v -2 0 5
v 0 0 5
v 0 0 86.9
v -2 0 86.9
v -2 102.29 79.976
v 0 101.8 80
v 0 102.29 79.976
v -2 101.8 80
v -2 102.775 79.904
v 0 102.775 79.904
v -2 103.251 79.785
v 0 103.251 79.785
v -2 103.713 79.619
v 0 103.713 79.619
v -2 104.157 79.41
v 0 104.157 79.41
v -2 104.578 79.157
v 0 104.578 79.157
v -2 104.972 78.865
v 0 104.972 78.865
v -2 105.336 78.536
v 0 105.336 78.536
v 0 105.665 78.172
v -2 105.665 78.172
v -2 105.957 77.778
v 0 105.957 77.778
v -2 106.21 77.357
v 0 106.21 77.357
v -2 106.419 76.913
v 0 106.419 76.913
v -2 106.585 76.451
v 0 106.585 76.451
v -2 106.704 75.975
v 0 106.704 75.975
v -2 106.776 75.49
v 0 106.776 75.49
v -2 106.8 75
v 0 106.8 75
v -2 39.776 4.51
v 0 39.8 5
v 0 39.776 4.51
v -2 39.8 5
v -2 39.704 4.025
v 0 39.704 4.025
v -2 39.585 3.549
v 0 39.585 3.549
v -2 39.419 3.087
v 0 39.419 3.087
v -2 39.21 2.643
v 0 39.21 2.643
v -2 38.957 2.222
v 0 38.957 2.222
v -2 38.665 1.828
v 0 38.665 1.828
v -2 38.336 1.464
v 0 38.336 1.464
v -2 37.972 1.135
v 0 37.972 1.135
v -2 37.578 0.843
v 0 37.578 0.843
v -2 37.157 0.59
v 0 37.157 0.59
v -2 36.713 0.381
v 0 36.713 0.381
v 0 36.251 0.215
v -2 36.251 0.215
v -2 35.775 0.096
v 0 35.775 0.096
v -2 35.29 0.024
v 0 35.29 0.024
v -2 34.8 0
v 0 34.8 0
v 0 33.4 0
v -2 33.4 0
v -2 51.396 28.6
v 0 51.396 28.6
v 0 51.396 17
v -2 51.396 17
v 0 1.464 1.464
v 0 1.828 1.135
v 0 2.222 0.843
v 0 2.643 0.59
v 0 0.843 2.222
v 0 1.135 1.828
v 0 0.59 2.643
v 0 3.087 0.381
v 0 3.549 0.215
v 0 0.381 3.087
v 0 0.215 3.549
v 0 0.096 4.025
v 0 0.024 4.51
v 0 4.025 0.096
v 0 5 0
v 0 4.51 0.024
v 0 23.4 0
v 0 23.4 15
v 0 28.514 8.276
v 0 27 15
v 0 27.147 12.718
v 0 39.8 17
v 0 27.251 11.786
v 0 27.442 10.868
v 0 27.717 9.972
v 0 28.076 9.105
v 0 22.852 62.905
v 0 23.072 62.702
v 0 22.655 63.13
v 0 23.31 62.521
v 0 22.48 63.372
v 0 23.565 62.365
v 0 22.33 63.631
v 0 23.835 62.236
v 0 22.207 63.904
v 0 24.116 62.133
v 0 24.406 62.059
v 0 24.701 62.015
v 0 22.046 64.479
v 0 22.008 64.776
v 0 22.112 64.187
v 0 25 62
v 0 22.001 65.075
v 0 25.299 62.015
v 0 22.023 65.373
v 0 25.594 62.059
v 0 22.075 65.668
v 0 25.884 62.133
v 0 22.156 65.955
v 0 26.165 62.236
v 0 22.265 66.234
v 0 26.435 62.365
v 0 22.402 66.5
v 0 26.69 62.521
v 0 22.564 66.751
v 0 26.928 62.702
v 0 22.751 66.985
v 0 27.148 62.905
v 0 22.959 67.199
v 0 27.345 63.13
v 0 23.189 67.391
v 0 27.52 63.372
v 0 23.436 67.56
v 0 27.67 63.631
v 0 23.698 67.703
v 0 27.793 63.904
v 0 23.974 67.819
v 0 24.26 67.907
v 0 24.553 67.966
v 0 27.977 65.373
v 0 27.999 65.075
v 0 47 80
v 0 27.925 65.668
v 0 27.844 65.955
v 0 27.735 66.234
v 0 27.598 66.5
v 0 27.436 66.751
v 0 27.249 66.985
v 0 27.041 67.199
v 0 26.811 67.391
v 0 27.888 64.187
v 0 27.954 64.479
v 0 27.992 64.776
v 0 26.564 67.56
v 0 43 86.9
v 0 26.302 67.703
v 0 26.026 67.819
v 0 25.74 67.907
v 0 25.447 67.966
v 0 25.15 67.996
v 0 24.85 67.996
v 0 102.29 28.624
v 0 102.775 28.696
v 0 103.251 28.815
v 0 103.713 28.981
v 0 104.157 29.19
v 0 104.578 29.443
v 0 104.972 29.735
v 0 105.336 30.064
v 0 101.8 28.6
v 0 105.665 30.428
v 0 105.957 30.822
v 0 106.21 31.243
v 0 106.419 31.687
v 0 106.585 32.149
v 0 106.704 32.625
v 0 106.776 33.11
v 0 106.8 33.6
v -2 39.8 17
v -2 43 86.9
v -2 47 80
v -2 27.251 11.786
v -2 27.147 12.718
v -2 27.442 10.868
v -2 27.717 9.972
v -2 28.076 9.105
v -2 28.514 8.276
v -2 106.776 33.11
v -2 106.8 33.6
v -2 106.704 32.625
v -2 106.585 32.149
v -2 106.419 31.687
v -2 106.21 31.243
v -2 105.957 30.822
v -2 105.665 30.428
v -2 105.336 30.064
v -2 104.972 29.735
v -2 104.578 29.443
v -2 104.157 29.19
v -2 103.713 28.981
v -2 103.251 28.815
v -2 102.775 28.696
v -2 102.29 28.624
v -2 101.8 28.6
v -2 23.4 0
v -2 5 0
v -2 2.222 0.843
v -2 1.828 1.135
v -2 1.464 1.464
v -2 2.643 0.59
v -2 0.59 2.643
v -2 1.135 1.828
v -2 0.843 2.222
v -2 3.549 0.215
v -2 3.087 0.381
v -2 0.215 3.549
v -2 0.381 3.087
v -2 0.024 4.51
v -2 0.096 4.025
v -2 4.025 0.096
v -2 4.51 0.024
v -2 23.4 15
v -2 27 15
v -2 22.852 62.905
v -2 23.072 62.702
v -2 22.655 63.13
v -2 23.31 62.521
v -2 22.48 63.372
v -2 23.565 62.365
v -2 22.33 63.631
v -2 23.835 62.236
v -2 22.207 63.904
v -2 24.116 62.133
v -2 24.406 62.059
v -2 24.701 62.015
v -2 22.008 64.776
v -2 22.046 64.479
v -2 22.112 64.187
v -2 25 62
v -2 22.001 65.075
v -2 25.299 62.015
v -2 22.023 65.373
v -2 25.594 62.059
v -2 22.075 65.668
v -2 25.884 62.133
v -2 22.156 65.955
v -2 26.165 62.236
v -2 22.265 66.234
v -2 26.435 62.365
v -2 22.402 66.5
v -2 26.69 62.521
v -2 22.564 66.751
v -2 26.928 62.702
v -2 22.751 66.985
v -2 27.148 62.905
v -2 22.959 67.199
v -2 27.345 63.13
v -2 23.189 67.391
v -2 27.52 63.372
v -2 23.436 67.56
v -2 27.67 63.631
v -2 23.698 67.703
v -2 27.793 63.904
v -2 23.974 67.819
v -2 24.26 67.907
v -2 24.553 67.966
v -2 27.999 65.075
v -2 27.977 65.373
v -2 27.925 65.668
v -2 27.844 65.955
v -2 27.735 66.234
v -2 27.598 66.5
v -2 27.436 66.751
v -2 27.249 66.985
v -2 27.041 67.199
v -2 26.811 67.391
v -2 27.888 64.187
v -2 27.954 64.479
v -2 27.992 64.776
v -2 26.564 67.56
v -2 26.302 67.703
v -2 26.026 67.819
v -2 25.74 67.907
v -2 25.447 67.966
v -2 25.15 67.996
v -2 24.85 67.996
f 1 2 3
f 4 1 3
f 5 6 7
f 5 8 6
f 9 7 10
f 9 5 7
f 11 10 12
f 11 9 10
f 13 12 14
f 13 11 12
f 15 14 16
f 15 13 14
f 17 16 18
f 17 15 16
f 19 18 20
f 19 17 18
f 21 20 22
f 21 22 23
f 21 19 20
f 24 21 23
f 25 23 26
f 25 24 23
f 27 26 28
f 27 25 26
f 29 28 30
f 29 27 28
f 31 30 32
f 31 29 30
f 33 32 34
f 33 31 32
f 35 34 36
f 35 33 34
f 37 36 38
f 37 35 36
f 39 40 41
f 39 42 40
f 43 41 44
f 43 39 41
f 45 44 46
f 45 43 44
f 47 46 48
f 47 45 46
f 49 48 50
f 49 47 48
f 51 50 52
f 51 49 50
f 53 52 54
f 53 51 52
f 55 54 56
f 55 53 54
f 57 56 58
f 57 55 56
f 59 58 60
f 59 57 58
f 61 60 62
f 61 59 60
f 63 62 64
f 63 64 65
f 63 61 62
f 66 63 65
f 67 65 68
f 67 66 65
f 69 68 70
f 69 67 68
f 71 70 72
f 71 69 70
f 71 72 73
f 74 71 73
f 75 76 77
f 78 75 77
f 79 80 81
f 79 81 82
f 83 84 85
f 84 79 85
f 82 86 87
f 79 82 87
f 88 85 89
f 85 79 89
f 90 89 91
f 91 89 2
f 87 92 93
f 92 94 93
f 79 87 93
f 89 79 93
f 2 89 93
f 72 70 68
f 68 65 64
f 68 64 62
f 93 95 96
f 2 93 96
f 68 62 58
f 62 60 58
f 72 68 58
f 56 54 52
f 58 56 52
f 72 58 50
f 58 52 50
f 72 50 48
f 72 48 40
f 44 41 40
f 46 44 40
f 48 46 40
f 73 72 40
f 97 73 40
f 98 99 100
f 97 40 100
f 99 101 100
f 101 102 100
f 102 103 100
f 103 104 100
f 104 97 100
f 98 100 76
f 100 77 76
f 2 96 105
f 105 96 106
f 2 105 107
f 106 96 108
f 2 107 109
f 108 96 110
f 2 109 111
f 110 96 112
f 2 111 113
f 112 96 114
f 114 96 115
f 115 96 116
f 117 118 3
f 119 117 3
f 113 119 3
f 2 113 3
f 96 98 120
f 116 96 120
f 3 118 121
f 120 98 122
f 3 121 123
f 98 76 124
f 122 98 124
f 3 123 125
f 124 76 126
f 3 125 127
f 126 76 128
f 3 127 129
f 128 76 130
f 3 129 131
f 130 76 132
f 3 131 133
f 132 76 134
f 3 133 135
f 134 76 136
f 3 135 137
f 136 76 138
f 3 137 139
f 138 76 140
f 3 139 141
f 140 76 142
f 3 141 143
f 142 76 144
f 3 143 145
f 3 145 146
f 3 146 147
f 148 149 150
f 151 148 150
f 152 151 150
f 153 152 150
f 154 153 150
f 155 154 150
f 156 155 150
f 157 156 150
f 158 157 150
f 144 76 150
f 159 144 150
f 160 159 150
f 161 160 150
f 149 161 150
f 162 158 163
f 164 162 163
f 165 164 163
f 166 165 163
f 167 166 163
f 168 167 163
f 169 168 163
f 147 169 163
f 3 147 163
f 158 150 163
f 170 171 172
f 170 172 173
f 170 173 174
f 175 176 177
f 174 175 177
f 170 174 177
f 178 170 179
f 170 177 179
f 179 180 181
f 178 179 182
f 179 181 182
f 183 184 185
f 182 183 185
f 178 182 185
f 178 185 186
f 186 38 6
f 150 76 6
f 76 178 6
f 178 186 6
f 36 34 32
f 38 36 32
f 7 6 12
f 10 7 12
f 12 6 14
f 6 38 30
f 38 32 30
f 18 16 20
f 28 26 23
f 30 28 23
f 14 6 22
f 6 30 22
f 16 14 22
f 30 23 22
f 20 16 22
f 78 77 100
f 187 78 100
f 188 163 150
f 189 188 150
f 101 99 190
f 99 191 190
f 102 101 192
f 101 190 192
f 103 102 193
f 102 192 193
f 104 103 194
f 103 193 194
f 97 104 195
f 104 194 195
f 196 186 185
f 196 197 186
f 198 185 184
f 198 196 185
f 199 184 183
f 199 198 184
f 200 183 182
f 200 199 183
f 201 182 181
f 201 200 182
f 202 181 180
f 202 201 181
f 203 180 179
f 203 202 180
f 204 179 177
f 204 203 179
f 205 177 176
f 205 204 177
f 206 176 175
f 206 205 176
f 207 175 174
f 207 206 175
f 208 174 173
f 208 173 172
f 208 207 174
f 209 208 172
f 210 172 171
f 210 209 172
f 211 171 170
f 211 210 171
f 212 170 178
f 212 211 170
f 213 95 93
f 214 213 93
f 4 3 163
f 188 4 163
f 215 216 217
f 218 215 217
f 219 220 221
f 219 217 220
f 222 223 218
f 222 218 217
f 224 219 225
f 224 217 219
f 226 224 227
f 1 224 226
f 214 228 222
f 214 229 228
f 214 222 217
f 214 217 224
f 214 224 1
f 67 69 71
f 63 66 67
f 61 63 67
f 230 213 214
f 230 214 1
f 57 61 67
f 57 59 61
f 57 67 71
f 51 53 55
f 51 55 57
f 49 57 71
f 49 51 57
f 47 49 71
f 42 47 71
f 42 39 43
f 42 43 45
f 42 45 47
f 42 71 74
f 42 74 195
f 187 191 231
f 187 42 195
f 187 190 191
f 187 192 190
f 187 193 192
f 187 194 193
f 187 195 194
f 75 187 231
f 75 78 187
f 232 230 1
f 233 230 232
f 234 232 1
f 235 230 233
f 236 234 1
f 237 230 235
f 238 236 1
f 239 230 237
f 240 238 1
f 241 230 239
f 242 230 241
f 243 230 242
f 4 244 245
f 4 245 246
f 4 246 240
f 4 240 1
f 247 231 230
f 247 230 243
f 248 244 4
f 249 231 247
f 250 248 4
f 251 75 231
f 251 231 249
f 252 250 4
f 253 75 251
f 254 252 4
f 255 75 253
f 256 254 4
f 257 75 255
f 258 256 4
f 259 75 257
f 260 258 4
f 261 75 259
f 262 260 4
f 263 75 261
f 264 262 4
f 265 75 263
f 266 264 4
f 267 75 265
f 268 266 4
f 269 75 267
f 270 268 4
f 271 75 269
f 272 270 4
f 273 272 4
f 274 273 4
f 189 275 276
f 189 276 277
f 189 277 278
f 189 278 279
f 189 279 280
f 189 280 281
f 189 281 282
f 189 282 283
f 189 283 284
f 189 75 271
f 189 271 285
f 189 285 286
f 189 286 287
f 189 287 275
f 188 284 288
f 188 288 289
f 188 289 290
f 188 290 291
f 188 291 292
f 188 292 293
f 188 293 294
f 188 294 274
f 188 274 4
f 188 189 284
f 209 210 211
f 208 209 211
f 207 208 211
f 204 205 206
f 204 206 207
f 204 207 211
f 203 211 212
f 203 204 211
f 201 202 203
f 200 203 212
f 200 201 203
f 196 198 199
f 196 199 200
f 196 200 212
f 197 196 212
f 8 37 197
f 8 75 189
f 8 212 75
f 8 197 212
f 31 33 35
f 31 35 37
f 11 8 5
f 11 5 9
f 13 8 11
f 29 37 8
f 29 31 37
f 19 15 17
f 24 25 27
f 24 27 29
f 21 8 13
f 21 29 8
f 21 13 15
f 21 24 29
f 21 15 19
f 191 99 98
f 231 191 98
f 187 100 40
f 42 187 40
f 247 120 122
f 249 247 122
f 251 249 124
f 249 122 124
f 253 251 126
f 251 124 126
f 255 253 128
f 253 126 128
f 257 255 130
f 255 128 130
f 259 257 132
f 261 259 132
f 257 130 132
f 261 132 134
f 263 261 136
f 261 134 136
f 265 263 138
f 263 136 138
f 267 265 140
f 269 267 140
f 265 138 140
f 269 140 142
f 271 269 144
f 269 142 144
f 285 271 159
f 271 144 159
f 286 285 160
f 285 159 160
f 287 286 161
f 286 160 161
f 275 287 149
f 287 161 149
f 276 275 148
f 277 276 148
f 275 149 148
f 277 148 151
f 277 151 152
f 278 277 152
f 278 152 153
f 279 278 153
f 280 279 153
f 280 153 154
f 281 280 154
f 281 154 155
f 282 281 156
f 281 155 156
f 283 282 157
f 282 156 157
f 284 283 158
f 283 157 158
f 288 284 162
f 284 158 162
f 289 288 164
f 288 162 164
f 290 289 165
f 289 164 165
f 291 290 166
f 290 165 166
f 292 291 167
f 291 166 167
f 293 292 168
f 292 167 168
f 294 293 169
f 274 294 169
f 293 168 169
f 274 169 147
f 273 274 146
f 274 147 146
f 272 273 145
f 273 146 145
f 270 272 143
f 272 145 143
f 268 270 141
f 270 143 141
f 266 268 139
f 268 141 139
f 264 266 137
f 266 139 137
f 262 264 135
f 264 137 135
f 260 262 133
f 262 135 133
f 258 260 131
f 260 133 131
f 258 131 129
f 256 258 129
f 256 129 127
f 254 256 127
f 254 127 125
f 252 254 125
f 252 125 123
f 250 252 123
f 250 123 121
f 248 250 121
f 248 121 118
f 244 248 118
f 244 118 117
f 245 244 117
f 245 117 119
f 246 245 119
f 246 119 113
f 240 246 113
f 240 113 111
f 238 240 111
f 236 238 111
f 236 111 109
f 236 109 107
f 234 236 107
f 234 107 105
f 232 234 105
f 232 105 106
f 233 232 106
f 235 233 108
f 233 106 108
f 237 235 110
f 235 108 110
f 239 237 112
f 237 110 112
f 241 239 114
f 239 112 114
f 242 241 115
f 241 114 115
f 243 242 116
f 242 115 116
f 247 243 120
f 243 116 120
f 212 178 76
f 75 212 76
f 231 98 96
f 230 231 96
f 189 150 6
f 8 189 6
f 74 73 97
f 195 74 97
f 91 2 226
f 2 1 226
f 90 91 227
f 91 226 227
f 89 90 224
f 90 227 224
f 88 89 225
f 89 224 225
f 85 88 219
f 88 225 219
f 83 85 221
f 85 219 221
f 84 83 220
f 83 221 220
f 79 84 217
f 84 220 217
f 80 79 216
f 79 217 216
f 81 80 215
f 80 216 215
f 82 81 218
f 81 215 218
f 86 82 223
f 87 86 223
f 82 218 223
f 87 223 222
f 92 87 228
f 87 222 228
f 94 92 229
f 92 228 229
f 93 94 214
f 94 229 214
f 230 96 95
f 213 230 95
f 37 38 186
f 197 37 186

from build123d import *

# Parameters (mm, degrees)
AUFSATZ_LINEAR_AUSTRAGEN1_DEPTH = 2
VERRUNDUNG6_R                   = 5
VERRUNDUNG7_R                   = 10
SKIZZE4_R                       = 3
SCHNITT_LINEAR_AUSTRAGEN1_DEPTH = 2


with BuildPart() as part:
    # Skizze2 → Aufsatz-Linear austragen1 (new body)
    with BuildSketch(Plane(origin=(0, 0, 0), x_dir=(0, 0, -1), z_dir=(1, 0, 0))):
        Polygon((0, 0), (-86.9, 0), (-86.9, 43), (-80, 47), (-80, 106.8), (-28.6, 106.8), (-28.6, 51.396087758), (-17, 51.396087758), (-17, 39.8), (0, 39.8), (0, 33.4), (-10.333924714, 27.3), (-15, 27), (-15, 23.4), (0, 23.4), align=None)
    extrude(amount=-AUFSATZ_LINEAR_AUSTRAGEN1_DEPTH)

    # Verrundung6
    verrundung6_edges = [part.edges().sort_by_distance(p)[0] for p in [
        (-1, 0, 0),
        (-1, 106.8, 80),
        (-1, 106.8, 28.6),
        (-1, 39.8, 0),
    ]]
    fillet(verrundung6_edges, radius=VERRUNDUNG6_R)

    # Verrundung7
    verrundung7_edges = [part.edges().sort_by_distance(p)[0] for p in [
        (-1, 27.3, 10.333924714),
    ]]
    fillet(verrundung7_edges, radius=VERRUNDUNG7_R)

    # Skizze4 → Schnitt-Linear austragen1 (cut)
    with BuildSketch(Plane(origin=(0, 0, 0), x_dir=(0, 0, -1), z_dir=(1, 0, 0))):
        with Locations((-65, 25)):
            Circle(SKIZZE4_R)
    extrude(amount=-SCHNITT_LINEAR_AUSTRAGEN1_DEPTH, mode=Mode.SUBTRACT)


solid = part.part
